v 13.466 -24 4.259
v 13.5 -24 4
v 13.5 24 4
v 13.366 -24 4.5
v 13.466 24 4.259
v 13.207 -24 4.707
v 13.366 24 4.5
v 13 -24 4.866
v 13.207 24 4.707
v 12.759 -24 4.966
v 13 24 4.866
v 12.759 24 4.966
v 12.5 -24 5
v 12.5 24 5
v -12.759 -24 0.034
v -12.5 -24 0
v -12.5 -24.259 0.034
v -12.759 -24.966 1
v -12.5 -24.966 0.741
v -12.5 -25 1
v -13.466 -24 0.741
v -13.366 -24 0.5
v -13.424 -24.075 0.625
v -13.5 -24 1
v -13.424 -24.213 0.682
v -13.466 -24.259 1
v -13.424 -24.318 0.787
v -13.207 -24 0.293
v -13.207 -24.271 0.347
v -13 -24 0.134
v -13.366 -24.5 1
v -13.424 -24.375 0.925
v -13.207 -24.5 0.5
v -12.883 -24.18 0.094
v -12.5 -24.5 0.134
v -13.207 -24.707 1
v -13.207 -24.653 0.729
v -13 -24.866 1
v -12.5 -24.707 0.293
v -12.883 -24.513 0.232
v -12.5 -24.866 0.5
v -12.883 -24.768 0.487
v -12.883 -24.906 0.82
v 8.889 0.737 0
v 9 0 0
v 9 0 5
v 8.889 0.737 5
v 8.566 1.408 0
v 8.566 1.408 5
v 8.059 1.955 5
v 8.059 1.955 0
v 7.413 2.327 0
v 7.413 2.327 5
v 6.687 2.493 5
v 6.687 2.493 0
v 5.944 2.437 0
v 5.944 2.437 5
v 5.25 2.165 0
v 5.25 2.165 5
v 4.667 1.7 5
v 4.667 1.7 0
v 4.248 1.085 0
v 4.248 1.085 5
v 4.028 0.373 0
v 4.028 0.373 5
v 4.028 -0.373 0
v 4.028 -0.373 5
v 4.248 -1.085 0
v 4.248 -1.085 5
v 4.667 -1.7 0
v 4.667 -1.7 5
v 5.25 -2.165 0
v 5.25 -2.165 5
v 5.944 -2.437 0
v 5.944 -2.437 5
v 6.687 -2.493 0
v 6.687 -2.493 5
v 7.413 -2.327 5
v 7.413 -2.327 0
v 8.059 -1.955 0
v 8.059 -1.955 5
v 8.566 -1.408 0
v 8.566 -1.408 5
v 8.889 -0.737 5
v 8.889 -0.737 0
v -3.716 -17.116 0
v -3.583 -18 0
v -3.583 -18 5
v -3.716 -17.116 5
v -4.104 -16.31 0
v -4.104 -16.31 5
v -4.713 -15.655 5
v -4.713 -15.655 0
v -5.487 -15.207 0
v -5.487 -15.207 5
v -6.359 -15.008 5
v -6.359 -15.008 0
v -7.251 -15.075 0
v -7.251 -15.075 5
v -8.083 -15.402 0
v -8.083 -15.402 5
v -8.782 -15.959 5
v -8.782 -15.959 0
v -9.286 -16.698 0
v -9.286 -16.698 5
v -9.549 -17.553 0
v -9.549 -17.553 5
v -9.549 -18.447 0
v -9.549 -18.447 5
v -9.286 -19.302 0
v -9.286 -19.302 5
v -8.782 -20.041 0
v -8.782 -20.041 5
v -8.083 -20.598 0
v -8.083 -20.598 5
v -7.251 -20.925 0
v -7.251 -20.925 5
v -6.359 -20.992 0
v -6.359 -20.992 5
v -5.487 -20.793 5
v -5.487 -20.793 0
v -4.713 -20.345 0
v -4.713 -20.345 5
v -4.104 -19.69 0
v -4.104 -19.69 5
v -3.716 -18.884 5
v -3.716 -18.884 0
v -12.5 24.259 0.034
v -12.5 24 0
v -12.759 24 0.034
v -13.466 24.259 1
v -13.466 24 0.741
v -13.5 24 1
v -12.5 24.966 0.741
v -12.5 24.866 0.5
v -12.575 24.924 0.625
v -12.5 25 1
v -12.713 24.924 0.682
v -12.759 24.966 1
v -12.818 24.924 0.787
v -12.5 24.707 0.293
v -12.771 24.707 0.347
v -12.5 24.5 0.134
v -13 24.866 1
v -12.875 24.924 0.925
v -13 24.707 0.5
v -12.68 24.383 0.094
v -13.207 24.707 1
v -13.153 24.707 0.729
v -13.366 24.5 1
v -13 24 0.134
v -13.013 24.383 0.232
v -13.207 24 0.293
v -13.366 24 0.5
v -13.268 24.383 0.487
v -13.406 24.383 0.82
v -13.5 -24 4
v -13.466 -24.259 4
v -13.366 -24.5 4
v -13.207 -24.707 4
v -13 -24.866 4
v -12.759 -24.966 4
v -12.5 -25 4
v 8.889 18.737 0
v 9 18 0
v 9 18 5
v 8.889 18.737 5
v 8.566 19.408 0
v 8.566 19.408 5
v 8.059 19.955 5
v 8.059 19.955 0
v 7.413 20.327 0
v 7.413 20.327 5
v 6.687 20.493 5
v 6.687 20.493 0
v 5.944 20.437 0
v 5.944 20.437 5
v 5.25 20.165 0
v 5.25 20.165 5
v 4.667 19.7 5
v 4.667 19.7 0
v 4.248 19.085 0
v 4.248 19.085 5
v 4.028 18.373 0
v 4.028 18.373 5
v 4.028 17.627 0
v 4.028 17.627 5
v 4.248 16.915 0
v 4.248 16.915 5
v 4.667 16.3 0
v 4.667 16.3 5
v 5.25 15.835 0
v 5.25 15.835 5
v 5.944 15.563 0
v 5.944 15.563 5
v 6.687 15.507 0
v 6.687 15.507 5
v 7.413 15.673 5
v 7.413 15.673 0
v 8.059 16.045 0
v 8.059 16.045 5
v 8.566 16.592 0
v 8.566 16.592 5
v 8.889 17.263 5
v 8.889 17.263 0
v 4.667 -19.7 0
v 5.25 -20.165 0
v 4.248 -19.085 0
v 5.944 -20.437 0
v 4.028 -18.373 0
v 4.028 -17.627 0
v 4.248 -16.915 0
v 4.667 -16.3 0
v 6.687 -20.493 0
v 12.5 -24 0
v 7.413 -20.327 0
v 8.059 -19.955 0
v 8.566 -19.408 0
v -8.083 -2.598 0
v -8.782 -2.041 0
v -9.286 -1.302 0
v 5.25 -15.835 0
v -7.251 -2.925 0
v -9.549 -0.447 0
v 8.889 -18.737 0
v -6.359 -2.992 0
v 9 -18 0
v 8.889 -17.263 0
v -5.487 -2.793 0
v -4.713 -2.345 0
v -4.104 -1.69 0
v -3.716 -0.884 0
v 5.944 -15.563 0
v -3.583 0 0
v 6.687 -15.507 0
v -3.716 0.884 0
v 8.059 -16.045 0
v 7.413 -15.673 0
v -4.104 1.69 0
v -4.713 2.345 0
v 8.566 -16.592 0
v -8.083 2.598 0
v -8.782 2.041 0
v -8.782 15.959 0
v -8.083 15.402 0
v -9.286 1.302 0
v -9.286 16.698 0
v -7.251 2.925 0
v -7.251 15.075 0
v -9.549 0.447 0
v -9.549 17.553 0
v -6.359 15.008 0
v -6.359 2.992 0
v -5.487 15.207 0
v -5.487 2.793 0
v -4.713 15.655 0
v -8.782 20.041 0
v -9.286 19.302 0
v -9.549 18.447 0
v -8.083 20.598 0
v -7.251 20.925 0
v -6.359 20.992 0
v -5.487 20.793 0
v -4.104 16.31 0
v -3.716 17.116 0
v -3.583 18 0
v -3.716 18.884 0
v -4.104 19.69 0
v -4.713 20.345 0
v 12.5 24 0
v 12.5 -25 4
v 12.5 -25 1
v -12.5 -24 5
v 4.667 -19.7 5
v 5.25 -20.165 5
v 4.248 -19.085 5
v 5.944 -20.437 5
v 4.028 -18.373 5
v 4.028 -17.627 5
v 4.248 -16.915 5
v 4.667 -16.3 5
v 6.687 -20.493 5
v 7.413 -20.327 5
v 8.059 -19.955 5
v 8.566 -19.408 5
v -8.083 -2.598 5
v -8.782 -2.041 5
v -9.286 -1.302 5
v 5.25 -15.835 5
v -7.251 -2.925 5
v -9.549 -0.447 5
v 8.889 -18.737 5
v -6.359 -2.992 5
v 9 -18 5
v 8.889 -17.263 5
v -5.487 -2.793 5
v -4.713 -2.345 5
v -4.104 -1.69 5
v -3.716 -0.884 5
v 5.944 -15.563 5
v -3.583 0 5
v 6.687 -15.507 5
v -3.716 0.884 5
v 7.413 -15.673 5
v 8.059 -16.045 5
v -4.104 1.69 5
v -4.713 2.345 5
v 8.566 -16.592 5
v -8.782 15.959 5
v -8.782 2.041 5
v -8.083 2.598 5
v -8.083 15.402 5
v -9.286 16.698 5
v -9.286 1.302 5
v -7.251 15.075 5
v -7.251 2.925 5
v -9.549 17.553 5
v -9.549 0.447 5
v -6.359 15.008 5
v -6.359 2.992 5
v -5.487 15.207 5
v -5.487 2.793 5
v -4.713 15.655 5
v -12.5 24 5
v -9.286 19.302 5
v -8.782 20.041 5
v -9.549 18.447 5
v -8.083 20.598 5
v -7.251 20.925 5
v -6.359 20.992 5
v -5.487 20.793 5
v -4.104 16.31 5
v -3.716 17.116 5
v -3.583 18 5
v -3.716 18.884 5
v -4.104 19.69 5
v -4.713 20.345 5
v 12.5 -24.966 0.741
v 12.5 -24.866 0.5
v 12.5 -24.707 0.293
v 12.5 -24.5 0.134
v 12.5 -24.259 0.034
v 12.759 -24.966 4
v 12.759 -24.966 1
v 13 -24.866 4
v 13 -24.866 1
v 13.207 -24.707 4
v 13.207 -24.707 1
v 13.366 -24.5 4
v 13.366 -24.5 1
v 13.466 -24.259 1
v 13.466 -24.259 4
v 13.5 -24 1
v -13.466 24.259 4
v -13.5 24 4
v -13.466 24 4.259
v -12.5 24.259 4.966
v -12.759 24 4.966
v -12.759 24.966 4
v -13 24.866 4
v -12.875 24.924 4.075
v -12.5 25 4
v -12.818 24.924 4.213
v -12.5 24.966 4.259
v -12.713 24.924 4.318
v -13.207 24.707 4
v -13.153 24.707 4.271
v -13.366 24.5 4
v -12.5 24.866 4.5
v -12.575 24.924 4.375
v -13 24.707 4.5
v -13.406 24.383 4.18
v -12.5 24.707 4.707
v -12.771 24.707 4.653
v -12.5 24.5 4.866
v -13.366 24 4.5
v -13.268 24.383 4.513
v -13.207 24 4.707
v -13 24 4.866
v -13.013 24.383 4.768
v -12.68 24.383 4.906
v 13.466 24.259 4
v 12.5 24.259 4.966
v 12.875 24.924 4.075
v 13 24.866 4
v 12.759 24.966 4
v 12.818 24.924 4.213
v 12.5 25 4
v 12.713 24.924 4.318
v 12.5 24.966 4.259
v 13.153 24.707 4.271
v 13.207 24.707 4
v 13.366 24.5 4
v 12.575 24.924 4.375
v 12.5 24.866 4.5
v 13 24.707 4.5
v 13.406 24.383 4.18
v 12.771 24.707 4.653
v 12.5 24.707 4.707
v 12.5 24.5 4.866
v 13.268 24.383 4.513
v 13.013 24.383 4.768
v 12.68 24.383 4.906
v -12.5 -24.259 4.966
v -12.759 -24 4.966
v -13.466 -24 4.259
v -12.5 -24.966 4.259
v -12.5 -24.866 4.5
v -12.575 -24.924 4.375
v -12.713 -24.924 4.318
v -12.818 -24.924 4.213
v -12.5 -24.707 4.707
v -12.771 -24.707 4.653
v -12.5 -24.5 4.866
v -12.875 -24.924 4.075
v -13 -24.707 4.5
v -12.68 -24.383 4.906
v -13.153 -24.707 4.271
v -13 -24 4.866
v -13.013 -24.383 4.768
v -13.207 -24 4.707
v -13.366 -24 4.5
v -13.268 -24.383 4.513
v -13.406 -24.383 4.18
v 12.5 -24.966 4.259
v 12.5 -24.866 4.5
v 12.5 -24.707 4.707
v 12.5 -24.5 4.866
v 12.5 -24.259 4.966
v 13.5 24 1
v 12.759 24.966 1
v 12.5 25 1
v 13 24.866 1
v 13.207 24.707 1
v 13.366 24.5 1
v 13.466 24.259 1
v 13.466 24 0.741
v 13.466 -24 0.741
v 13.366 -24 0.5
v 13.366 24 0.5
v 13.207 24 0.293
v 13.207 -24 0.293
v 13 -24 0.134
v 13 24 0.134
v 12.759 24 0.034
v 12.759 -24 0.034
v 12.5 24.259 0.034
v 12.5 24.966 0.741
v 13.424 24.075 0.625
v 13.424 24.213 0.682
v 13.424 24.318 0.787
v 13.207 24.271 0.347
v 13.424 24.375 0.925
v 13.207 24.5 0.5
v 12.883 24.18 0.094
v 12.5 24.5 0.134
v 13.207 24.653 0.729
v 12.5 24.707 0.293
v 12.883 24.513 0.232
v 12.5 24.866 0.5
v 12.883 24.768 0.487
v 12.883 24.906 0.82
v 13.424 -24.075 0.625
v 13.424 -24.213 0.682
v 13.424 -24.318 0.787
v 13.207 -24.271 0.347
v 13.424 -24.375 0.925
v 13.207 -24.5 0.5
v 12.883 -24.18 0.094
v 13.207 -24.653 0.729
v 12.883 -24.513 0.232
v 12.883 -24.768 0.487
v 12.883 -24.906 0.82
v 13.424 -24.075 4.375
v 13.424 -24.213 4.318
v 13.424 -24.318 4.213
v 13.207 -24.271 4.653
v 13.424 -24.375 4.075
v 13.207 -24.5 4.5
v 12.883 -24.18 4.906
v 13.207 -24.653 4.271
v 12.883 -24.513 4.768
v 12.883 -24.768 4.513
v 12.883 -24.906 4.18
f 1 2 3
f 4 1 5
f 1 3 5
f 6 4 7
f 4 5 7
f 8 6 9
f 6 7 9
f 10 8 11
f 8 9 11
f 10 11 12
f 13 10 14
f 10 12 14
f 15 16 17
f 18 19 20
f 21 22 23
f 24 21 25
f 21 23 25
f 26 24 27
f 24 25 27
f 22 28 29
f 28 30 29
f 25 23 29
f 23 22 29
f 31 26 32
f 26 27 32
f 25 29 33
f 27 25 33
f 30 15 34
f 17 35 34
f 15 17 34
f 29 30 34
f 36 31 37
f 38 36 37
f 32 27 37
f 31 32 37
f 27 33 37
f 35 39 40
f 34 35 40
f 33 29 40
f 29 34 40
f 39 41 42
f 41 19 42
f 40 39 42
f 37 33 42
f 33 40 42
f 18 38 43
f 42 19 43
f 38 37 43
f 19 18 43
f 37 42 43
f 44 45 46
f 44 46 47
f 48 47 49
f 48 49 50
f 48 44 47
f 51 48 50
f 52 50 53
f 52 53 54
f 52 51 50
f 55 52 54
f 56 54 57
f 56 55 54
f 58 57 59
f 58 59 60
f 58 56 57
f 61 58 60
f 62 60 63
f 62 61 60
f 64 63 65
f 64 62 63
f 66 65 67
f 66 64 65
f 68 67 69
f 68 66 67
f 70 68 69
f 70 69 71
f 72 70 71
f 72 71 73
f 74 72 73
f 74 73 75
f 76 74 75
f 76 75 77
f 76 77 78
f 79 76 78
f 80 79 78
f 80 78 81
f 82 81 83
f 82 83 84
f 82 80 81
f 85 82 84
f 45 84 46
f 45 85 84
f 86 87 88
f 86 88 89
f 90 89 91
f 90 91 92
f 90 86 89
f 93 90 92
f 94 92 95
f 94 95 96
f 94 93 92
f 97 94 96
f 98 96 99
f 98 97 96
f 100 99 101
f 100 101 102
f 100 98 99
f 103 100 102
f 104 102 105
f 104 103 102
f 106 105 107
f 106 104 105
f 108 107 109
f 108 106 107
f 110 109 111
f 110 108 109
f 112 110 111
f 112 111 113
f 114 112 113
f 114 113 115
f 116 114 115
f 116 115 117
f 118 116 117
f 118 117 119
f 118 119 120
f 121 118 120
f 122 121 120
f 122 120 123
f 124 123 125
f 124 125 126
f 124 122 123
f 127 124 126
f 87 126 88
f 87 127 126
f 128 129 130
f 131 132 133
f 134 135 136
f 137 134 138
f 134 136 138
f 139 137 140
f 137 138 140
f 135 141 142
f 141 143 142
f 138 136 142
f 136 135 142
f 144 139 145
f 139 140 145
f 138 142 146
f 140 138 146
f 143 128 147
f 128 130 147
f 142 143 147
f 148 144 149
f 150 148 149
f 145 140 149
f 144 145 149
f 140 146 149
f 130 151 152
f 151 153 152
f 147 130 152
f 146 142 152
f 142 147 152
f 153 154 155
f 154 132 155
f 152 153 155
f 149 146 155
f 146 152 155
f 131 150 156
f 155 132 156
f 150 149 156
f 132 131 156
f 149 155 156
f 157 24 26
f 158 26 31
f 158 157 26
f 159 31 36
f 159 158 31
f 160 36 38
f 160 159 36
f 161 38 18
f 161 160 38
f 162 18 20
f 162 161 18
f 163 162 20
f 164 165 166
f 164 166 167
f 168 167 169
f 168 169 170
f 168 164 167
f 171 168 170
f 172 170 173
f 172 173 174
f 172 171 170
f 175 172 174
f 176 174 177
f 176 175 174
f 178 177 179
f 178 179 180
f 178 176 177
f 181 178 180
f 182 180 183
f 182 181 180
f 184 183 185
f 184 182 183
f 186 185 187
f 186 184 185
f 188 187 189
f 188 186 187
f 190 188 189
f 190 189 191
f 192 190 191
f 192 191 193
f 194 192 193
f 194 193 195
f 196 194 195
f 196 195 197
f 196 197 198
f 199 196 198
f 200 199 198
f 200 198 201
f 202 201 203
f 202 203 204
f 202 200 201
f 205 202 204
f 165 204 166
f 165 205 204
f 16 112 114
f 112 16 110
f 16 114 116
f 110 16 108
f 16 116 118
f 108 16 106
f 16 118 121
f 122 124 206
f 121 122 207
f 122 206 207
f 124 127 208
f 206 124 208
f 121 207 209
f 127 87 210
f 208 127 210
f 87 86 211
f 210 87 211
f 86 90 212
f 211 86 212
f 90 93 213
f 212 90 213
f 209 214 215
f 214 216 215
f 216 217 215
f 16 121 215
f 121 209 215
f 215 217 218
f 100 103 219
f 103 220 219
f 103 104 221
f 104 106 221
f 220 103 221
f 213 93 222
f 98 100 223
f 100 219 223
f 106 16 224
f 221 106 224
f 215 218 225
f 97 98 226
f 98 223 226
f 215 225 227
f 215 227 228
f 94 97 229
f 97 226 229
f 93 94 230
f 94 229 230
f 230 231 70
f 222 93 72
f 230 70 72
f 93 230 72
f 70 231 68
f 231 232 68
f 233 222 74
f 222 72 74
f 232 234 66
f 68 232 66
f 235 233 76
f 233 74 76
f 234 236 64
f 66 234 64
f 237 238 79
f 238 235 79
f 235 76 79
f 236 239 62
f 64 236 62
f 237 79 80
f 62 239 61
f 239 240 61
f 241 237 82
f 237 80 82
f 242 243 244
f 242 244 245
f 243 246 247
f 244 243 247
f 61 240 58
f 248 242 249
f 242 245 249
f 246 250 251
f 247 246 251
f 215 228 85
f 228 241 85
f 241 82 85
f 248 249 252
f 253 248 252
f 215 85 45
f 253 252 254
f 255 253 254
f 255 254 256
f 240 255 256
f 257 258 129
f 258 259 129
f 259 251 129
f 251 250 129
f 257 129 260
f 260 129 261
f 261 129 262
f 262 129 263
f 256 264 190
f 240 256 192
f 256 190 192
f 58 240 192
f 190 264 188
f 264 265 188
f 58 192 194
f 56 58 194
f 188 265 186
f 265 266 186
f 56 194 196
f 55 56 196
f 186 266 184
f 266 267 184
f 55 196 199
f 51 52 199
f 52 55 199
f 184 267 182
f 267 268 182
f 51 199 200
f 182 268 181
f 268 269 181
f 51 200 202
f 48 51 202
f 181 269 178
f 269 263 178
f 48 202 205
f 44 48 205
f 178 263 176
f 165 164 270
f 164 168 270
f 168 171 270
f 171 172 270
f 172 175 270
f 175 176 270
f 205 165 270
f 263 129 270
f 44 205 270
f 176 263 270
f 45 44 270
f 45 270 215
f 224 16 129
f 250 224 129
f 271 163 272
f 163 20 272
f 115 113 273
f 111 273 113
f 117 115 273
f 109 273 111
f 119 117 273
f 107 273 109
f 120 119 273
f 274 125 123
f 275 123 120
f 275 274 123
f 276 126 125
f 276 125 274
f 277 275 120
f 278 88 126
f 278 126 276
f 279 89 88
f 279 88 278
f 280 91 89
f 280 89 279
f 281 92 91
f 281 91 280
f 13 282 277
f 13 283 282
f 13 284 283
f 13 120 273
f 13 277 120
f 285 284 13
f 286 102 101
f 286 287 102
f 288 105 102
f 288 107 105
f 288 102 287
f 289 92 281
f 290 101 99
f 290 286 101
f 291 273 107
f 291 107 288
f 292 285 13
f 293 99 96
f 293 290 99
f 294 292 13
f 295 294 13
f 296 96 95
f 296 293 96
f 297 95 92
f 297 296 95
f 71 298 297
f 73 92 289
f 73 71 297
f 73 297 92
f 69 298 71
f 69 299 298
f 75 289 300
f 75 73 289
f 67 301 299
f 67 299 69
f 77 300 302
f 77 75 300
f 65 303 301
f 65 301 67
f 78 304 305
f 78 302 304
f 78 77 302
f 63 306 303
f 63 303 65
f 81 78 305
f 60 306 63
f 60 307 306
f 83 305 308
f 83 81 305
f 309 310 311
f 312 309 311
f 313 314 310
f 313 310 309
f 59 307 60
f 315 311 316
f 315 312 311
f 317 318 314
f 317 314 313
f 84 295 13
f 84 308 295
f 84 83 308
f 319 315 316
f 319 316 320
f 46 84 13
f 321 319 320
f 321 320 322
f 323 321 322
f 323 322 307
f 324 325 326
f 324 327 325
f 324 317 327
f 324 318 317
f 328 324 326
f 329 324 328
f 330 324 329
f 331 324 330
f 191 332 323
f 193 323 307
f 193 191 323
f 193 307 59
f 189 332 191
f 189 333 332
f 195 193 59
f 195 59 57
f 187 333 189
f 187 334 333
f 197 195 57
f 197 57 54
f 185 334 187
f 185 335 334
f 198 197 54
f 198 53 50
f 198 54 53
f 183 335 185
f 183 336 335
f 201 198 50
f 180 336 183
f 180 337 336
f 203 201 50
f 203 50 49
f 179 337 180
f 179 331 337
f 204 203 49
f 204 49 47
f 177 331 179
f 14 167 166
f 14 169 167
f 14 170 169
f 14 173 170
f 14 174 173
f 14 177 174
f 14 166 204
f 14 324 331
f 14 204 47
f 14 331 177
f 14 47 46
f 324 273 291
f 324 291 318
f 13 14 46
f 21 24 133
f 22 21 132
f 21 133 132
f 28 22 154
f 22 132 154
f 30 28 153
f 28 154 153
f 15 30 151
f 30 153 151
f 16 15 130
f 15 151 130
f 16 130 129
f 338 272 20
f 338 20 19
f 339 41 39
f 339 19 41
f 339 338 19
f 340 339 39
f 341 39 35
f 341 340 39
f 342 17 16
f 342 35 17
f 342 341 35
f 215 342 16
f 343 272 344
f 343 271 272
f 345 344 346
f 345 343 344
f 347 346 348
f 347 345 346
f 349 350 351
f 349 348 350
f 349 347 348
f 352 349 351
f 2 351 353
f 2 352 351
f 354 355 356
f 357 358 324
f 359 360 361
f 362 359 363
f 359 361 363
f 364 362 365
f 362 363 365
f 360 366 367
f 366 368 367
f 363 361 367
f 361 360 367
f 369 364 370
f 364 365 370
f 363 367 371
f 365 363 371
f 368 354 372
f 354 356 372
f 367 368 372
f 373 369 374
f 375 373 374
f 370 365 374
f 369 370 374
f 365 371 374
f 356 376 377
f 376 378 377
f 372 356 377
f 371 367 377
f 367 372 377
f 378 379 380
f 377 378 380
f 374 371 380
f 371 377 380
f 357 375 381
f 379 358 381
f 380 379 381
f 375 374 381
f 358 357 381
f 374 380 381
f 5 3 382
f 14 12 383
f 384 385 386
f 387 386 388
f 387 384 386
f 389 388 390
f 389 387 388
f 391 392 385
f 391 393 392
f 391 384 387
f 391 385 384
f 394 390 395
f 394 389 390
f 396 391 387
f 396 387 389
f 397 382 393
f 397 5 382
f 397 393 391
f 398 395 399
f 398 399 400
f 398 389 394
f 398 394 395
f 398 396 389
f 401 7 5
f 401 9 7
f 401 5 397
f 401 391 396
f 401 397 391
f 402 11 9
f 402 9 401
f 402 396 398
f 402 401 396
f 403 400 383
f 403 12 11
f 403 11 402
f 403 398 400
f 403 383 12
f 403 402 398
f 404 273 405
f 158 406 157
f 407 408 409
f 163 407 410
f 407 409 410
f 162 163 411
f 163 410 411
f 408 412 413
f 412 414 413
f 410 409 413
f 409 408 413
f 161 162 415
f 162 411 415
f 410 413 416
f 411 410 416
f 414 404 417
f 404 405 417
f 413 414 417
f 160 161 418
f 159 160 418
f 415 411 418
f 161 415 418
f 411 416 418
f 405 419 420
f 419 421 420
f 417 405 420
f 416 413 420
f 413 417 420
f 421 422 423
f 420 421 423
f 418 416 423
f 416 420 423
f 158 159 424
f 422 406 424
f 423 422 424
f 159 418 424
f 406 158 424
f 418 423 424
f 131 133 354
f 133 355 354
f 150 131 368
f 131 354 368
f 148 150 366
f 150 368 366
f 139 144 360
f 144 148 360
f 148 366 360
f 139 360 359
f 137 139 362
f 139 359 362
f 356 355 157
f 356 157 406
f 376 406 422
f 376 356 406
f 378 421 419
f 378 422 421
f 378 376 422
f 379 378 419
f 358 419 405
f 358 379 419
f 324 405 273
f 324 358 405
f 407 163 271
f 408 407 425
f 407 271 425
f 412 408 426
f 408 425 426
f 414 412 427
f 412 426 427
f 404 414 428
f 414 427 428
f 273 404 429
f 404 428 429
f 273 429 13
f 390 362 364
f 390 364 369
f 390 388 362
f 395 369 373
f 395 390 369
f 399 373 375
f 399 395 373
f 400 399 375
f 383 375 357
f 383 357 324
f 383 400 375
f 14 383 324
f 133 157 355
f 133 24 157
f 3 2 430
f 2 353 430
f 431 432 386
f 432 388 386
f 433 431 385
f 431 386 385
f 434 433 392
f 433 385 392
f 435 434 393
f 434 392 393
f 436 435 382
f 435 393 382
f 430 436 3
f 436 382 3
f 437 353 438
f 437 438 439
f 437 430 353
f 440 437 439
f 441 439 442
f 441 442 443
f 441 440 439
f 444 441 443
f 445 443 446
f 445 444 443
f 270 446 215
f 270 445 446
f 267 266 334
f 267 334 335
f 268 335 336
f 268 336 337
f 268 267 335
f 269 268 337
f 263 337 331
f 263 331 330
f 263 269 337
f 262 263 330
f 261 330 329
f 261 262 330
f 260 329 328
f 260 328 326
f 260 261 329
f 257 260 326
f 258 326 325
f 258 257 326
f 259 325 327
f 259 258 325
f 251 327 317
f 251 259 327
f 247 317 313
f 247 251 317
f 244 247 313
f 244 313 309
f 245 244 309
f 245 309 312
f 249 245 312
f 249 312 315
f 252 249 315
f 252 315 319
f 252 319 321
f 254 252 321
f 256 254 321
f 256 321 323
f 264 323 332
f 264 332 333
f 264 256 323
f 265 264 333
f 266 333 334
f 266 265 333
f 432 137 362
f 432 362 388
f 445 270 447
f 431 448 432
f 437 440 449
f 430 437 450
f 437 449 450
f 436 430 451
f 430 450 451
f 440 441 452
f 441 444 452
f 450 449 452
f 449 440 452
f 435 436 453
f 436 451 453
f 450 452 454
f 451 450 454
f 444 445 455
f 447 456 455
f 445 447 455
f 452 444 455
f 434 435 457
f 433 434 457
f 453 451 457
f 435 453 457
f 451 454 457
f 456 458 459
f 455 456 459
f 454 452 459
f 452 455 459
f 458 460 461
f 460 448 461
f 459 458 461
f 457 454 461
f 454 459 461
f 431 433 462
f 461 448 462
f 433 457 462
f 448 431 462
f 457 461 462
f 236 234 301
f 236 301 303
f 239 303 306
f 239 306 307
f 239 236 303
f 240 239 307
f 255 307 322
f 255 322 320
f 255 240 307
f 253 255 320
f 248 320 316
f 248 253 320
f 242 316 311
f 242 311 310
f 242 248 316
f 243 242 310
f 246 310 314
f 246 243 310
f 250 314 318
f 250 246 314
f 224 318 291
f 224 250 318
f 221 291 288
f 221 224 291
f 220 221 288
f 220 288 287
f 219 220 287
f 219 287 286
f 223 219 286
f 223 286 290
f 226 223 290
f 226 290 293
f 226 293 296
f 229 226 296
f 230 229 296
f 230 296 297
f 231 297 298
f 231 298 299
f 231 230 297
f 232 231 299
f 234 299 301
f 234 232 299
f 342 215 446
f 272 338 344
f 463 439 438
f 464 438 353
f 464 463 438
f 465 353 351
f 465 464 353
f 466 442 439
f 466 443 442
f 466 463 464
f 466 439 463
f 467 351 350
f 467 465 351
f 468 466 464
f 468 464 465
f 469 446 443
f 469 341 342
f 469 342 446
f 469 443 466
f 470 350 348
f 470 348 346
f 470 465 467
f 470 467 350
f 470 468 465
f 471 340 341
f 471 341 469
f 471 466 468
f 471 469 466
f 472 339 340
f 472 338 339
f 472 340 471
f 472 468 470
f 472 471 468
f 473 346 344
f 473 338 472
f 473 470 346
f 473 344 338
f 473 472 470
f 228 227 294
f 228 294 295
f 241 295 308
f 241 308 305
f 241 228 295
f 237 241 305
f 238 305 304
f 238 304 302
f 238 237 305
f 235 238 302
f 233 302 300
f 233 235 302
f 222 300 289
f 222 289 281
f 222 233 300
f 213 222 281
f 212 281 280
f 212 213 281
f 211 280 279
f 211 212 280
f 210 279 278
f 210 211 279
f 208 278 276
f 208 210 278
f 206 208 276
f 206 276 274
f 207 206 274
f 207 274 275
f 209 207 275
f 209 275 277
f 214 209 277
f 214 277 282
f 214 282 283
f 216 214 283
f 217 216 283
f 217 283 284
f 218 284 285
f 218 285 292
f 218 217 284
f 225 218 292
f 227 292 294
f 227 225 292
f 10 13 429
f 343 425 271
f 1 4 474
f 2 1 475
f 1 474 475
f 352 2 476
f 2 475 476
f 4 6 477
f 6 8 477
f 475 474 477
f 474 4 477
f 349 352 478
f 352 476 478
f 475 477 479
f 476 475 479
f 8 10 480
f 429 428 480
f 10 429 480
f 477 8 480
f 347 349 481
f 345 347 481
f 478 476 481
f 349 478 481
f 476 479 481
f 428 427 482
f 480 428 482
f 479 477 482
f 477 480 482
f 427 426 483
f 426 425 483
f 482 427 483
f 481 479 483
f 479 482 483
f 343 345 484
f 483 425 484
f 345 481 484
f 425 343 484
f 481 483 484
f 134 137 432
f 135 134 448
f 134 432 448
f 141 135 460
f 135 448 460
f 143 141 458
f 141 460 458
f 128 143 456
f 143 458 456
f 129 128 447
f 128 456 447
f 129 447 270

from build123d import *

# Parameters (mm, degrees)
SKETCH1_W           = 27
SKETCH1_H           = 50
SKETCH1_R           = 3
SKETCH1_R_2         = 2.5
BOSS_EXTRUDE1_DEPTH = 5
FILLET2_R           = 1


with BuildPart() as part:
    # Sketch1 → Boss-Extrude1 (new body)
    with BuildSketch(Plane.XY):
        Rectangle(SKETCH1_W, SKETCH1_H)
        with Locations((-6.582992823, 18)):
            Circle(SKETCH1_R, mode=Mode.SUBTRACT)
        with Locations((-6.582992823, 0)):
            Circle(SKETCH1_R, mode=Mode.SUBTRACT)
        with Locations((-6.582992823, -18)):
            Circle(SKETCH1_R, mode=Mode.SUBTRACT)
        with Locations((6.5, 18)):
            Circle(SKETCH1_R_2, mode=Mode.SUBTRACT)
        with Locations((6.5, 0)):
            Circle(SKETCH1_R_2, mode=Mode.SUBTRACT)
        with Locations((6.5, -18)):
            Circle(SKETCH1_R_2, mode=Mode.SUBTRACT)
    extrude(amount=BOSS_EXTRUDE1_DEPTH)

    # Fillet2
    fillet2_edges = [part.edges().sort_by_distance(p)[0] for p in [
        (-13.5, 0, 5),
        (0, -25, 5),
        (13.5, 0, 5),
        (0, -25, 0),
        (-13.5, 0, 0),
        (0, 25, 0),
        (13.5, 0, 0),
        (13.5, -25, 2.5),
        (-13.5, -25, 2.5),
        (-13.5, 25, 2.5),
        (13.5, 25, 2.5),
        (0, 25, 5),
    ]]
    fillet(fillet2_edges, radius=FILLET2_R)


solid = part.part
